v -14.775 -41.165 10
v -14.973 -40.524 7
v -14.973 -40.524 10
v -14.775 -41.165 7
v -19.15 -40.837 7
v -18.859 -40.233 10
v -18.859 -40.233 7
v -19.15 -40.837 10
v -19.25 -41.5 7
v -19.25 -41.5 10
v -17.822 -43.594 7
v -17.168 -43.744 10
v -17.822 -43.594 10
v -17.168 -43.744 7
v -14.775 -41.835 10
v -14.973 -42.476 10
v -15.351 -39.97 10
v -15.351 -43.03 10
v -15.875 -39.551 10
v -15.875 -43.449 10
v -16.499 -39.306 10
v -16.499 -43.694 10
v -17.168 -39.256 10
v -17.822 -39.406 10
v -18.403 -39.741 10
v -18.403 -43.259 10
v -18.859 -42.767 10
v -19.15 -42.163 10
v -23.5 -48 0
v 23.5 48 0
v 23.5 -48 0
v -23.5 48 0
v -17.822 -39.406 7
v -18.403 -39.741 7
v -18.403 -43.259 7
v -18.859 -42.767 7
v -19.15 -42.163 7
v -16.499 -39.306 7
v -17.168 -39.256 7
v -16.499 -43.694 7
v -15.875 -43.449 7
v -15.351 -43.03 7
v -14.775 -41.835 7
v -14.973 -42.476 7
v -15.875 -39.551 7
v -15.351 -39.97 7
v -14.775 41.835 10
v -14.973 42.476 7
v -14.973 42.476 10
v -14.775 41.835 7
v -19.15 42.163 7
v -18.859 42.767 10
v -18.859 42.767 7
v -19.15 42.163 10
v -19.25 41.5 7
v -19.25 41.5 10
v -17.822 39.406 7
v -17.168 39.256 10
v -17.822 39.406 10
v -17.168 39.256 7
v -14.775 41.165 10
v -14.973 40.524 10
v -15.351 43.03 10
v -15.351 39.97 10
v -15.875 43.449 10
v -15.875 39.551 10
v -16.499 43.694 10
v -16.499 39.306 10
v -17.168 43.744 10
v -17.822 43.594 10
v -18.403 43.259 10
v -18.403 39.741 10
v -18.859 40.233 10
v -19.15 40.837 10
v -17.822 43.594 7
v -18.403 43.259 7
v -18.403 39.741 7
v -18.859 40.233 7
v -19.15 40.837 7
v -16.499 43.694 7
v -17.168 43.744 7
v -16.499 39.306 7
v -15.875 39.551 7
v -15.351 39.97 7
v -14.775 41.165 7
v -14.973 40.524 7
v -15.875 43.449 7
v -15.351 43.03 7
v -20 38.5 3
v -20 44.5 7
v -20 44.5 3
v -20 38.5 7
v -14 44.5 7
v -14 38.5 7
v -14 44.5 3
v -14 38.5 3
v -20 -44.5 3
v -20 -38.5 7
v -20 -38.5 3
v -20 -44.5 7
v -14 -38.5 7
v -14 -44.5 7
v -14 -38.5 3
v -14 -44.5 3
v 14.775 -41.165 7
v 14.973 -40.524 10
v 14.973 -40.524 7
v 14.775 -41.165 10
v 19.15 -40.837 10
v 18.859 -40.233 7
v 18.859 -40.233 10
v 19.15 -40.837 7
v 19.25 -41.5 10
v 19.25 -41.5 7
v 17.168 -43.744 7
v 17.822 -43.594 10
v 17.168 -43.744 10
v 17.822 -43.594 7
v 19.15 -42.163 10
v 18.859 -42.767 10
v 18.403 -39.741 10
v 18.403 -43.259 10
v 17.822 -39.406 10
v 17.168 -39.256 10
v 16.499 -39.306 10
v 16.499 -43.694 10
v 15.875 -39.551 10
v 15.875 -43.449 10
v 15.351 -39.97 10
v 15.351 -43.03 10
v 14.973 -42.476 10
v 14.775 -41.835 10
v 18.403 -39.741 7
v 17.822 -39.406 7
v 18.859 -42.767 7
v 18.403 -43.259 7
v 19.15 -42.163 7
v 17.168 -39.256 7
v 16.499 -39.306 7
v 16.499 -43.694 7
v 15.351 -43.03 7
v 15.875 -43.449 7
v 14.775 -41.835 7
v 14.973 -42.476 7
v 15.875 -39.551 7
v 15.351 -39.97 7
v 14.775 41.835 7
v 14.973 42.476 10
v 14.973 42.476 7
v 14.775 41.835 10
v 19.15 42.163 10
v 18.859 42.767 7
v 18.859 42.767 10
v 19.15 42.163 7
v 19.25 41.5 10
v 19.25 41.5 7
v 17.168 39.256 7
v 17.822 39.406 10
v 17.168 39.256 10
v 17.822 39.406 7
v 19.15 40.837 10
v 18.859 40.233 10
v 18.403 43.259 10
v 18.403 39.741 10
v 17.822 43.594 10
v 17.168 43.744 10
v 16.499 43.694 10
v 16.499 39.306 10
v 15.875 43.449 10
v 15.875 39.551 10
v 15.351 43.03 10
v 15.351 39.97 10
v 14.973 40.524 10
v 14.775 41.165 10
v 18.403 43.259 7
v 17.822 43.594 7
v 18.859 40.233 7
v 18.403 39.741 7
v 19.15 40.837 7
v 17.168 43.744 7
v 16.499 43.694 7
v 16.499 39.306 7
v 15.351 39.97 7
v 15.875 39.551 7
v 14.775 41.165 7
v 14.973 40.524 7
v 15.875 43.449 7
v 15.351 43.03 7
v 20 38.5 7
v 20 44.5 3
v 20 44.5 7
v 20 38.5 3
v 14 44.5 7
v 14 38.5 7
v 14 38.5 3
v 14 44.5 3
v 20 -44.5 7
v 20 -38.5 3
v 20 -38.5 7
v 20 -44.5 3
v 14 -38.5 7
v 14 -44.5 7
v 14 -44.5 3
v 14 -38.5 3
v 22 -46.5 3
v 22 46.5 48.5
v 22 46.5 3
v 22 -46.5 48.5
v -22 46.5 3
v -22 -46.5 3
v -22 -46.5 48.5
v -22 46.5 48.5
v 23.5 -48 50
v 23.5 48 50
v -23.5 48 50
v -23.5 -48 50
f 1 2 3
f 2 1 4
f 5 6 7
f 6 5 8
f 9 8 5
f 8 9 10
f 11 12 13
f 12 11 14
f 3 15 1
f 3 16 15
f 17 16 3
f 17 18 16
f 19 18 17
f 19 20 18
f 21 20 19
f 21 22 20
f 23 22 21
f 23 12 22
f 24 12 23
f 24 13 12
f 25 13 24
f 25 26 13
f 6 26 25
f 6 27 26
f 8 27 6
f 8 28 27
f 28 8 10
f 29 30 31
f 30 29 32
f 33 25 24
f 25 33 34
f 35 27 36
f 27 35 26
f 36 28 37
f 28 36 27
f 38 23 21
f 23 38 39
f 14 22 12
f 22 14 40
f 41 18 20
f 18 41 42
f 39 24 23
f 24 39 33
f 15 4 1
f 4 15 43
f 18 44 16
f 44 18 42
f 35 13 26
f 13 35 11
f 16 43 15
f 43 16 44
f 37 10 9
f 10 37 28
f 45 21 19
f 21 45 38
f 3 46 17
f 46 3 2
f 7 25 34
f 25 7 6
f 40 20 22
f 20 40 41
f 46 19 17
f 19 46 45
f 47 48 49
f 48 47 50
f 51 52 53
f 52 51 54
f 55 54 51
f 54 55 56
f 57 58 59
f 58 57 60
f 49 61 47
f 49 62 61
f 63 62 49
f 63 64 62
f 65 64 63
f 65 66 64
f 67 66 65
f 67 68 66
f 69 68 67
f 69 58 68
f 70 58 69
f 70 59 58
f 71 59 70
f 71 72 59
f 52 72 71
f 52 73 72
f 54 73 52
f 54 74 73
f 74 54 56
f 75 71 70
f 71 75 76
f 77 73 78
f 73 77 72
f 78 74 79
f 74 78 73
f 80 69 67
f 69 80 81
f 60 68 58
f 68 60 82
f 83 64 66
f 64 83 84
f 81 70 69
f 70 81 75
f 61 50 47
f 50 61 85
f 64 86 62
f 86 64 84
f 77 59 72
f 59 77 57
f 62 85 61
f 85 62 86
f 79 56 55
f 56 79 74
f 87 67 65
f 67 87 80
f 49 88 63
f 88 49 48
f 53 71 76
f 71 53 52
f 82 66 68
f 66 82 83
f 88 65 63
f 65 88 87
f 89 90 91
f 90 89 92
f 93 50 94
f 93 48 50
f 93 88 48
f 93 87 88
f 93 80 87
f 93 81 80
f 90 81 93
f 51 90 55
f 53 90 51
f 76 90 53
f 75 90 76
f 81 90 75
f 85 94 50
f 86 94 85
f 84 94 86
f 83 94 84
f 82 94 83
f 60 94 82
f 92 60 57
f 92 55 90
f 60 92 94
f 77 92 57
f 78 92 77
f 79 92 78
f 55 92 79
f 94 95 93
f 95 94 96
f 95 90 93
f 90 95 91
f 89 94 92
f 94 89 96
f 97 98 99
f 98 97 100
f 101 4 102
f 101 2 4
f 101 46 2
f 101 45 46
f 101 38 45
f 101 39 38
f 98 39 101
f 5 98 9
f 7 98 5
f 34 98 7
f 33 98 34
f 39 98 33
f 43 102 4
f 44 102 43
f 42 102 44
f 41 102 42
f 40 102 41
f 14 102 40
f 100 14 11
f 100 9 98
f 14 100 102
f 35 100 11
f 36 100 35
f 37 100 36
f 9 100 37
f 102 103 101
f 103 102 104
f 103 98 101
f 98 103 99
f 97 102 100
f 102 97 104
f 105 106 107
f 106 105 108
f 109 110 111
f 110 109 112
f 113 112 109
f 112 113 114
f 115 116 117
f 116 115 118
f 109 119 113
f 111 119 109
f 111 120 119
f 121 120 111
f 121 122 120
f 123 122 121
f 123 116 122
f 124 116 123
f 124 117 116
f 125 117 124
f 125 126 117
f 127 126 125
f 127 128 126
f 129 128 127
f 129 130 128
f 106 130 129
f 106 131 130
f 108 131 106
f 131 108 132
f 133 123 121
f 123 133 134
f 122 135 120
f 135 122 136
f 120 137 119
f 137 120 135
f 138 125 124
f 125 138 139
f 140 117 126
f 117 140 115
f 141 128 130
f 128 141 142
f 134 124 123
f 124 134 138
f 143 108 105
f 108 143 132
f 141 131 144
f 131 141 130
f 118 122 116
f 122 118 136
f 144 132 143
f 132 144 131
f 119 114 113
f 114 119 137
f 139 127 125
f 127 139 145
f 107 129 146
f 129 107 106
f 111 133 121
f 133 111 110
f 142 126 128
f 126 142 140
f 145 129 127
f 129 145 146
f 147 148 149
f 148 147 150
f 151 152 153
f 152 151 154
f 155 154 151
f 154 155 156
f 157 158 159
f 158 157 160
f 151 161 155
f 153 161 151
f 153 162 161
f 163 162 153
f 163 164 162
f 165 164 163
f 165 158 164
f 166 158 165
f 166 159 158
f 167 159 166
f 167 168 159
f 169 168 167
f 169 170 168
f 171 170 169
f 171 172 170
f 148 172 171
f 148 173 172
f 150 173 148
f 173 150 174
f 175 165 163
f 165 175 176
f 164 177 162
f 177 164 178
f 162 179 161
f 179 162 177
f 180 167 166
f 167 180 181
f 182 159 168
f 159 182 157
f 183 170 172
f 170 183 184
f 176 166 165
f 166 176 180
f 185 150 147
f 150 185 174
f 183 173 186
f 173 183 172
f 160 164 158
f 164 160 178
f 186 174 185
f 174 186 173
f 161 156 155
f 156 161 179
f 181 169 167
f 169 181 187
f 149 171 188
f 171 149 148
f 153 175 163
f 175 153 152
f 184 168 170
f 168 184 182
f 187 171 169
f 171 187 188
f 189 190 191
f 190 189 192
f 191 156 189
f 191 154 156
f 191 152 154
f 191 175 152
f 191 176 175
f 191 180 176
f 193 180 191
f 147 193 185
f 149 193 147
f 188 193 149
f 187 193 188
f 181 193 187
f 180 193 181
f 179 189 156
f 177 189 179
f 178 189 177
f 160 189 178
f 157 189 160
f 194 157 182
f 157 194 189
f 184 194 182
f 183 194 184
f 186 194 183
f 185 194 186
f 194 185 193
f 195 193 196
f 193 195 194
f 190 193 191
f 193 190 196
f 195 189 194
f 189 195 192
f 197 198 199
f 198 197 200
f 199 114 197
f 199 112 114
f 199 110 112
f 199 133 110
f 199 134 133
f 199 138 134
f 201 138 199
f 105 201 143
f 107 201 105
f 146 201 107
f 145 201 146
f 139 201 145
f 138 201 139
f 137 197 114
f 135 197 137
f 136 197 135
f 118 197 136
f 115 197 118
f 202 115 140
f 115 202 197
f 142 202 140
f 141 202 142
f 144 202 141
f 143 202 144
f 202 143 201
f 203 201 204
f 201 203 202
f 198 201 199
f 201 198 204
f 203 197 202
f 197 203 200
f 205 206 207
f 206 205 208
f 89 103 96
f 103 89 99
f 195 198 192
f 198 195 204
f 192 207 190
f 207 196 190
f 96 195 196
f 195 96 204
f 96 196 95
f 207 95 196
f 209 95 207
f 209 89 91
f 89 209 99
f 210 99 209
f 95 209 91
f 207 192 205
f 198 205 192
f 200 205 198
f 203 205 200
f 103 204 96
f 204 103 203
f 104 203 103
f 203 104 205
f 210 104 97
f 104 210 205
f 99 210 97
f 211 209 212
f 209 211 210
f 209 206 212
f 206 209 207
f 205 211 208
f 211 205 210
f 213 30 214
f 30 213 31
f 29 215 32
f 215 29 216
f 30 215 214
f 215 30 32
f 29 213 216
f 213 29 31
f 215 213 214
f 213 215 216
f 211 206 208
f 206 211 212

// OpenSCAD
    include <constructive-compiled.scad>
    
    // units are in millimeter
    
    $fn=21; // directs the number of faces for round pieces
    
    dx = 34;
    dy = 83;
    dz = 50;
    
    diam = 4.5;
    
    extra = 10;
    thickness = 1.5;
    
    g(TOUP() ) 
    {
    
    // the base 
    box(x=dx+extra,y=dy+extra,z=3);
    box(x=dx+extra+2*thickness,y=dy+extra+2*thickness,z=thickness);
     
    // the supports
    two()
      g( reflectX(sides()), X(dx/2), Y(-dy/2) ,TOUP(), height(10), solid(true) )
      {
        tube(d=diam);
        box(x=6,y=6,z=7)
        g( Y(dy)) tube(d=diam) box(x=6,y=6,z=7)
        ;
      }  
    }
    
    // the box
    TOUP()
    clear(blue)
    {
    
      assemble() {
          g(Z(thickness)) 
          {      
             add()   
             box(x=dx+extra+2*thickness,y=dy+extra+2*thickness,z=dz-thickness);
            
             remove()Z(-2*thickness) 
             box(x=dx+extra,y=dy+extra,z=dz);  
          }
            
      }
    } 
    

    
